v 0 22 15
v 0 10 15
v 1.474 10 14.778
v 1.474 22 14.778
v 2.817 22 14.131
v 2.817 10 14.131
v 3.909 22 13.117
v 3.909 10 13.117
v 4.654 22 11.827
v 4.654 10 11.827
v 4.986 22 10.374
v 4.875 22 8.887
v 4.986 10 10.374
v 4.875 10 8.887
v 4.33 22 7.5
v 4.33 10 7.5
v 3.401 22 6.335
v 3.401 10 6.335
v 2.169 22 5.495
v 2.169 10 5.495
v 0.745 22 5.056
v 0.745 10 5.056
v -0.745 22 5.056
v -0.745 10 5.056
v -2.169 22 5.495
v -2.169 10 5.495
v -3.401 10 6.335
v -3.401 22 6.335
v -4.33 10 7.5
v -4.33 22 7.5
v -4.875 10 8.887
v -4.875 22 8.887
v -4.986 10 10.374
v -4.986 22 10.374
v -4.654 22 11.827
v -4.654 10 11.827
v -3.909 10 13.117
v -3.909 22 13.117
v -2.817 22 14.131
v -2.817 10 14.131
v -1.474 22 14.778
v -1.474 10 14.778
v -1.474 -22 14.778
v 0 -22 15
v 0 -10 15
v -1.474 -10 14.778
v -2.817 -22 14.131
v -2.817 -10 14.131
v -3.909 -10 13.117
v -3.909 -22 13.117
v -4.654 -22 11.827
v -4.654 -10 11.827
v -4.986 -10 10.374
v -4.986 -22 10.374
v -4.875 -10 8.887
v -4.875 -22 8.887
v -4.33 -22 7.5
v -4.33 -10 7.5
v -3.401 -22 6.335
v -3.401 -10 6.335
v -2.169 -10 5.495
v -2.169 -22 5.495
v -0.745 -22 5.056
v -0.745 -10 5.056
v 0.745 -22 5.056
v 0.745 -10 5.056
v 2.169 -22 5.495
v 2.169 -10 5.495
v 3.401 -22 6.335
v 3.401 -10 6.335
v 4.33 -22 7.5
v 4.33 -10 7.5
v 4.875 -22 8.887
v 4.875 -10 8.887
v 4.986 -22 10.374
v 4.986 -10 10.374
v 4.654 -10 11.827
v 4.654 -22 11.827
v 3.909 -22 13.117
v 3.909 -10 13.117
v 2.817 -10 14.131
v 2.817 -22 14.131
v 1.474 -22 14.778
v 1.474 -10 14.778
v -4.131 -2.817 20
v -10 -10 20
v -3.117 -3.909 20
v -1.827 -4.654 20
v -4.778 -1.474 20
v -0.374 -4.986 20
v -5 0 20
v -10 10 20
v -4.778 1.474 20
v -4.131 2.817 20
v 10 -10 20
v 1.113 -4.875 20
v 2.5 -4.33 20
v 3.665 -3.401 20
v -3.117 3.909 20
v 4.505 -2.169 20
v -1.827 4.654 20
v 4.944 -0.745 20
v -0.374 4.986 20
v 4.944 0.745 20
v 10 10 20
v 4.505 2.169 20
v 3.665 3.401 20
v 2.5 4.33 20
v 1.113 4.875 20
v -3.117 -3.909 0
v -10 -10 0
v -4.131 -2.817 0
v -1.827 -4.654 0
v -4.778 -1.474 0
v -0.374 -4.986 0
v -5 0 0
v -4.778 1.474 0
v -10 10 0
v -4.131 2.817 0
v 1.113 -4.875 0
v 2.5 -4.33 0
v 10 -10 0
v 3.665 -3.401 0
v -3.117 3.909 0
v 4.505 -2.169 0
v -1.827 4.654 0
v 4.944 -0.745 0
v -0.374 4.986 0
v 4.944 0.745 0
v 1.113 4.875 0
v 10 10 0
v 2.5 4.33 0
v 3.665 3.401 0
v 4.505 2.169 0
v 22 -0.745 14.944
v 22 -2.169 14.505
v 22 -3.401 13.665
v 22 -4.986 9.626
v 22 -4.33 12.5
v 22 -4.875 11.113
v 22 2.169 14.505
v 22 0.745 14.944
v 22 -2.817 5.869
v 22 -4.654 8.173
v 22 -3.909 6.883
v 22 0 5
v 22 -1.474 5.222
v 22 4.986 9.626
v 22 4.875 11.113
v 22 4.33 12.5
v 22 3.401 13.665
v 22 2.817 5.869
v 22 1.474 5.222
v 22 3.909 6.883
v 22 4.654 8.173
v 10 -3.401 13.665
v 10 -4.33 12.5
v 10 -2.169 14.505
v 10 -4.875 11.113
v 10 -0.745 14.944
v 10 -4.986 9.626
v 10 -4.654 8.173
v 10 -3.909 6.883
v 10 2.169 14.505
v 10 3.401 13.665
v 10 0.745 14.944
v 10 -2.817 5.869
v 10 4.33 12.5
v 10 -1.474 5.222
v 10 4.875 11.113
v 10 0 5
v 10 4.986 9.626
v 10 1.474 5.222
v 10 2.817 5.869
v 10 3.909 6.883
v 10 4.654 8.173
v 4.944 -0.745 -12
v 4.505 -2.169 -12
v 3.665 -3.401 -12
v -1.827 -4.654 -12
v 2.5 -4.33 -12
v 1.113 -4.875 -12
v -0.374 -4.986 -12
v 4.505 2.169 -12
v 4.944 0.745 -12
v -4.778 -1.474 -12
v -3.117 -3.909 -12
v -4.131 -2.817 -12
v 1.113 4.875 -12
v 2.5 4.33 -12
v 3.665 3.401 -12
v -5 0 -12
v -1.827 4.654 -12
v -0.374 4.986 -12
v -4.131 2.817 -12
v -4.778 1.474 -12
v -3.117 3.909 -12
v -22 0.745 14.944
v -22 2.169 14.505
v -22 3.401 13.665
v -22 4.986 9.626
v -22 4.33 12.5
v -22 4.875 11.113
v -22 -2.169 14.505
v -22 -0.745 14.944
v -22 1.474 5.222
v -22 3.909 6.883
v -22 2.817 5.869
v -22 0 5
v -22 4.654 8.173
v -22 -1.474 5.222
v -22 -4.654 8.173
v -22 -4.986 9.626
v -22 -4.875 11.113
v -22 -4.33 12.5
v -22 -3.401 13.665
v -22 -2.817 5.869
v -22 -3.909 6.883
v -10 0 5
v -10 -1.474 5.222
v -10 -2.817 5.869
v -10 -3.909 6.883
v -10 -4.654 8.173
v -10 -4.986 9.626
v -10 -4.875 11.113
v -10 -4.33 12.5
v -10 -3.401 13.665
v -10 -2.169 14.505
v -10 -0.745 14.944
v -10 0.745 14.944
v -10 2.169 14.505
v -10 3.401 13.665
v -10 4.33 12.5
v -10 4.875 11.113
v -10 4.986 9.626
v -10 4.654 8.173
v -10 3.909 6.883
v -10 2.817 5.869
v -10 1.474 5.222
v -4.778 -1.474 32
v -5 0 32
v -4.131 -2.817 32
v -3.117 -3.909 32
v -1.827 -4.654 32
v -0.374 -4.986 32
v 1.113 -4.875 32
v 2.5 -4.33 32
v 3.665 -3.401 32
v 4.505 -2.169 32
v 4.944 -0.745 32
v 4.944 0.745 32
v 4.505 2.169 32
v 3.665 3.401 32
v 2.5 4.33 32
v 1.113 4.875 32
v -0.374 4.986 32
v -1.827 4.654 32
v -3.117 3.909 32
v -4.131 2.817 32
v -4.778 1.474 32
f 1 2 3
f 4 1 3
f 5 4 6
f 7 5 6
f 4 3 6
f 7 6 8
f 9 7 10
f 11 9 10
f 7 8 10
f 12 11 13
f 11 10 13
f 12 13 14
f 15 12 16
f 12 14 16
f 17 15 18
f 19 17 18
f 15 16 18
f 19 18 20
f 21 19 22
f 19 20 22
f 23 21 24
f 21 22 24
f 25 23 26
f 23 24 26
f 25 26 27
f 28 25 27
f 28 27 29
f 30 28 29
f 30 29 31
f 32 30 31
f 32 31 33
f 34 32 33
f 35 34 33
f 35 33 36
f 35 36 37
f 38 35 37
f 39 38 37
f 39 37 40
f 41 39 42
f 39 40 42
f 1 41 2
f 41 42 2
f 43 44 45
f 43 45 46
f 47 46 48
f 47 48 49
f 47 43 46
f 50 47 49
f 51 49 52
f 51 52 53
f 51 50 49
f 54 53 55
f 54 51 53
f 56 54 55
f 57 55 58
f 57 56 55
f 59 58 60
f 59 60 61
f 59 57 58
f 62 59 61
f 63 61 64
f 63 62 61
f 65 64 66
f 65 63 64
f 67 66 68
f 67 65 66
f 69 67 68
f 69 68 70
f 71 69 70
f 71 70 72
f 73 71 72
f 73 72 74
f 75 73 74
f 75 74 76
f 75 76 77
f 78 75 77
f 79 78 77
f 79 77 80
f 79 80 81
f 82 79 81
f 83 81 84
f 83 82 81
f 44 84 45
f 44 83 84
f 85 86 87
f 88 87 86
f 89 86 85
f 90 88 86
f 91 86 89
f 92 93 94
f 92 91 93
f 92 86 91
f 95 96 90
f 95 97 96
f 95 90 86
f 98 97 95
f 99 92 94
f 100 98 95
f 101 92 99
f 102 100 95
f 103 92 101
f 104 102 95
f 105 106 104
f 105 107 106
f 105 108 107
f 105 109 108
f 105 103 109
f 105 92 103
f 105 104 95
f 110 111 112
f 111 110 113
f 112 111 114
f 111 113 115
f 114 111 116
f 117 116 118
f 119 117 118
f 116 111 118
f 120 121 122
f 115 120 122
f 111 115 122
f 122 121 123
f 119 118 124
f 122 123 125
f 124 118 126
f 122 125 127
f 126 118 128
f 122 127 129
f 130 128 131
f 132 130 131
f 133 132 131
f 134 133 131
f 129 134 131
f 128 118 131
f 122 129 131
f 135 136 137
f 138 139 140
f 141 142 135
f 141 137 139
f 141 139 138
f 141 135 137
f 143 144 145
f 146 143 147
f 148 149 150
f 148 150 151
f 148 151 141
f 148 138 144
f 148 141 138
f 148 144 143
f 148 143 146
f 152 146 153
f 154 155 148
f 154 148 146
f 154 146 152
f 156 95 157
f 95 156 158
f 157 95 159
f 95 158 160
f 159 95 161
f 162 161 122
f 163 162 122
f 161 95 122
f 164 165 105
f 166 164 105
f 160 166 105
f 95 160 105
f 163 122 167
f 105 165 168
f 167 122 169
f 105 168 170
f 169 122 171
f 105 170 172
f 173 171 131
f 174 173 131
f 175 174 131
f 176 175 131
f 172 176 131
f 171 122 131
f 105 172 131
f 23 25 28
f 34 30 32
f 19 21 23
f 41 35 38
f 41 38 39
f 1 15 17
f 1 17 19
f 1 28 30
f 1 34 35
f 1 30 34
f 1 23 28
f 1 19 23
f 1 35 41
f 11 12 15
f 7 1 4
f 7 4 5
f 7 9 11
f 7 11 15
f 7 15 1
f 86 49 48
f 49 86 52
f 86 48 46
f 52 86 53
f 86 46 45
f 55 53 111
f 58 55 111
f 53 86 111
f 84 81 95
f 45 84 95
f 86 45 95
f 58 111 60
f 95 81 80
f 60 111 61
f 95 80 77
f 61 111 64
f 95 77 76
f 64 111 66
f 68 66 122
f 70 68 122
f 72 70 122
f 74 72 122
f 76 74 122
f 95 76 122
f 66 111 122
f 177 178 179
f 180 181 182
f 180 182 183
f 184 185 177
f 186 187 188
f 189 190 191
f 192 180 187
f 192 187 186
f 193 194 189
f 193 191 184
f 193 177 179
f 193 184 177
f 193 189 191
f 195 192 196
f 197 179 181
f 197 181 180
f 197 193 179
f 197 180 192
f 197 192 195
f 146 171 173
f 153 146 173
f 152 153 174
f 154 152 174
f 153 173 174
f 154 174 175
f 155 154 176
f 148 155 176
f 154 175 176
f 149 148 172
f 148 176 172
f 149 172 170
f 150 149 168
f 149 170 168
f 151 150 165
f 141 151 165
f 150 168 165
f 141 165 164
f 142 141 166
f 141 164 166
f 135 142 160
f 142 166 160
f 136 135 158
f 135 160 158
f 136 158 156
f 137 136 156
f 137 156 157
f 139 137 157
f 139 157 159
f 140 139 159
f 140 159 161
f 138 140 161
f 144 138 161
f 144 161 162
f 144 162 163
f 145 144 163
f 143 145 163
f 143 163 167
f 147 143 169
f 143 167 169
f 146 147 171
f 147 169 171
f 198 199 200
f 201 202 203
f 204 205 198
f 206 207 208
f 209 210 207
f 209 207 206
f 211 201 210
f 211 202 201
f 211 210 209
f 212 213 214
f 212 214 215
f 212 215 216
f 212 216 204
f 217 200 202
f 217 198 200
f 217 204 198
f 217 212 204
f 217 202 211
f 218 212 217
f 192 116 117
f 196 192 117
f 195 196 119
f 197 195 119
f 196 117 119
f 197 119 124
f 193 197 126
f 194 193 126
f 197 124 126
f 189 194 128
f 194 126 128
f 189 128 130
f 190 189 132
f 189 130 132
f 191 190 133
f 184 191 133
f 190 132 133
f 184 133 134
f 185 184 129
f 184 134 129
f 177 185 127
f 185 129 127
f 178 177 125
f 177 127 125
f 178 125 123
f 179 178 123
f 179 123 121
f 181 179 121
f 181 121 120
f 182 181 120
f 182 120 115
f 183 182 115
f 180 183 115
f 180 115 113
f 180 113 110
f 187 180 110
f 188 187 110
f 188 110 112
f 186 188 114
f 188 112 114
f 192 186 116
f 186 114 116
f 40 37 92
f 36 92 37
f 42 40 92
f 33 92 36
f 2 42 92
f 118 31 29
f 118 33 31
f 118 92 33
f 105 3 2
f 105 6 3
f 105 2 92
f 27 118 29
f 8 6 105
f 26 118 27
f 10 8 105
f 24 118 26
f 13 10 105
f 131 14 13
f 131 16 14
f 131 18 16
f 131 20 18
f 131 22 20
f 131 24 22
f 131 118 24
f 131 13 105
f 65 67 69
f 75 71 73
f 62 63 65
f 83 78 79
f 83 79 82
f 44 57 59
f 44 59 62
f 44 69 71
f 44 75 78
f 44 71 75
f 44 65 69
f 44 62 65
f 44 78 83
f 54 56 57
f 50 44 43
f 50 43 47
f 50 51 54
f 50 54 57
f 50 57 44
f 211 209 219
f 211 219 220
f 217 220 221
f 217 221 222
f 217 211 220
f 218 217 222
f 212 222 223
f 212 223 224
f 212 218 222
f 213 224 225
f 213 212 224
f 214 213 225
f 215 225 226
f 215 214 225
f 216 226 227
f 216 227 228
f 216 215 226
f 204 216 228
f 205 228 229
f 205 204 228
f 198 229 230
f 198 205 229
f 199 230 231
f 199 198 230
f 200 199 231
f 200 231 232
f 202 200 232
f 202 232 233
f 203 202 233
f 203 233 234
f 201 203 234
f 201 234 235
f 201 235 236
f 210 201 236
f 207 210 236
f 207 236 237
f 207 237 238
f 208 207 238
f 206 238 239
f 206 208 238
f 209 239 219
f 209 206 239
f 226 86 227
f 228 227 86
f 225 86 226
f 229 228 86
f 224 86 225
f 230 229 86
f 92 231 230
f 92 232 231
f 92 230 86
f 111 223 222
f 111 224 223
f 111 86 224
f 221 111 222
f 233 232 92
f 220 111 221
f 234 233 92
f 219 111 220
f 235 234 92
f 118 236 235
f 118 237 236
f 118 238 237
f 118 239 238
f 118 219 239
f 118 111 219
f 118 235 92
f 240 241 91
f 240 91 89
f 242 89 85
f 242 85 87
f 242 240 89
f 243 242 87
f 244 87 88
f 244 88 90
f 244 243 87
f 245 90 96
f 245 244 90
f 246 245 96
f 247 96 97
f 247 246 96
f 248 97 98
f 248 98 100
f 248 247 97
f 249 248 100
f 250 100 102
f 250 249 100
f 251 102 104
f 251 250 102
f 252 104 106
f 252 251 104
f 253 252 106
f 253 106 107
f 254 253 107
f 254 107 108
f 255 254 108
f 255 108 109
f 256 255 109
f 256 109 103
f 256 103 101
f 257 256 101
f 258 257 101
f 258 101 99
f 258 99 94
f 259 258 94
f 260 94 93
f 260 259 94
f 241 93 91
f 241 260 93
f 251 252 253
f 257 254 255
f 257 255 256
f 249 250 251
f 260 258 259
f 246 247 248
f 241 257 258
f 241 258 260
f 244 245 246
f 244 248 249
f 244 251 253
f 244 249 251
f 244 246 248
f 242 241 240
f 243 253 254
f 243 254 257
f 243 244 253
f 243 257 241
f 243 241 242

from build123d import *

# Parameters (mm, degrees)
ESBO_O1_W                = 20
ESBO_O1_H                = 20
RESSALTO_EXTRUS_O1_DEPTH = 20
ESBO_O2_R                = 5
RESSALTO_EXTRUS_O2_DEPTH = 12
ESBO_O3_R                = 5
RESSALTO_EXTRUS_O3_DEPTH = 12
RESSALTO_EXTRUS_O4_START = 12
ESBO_O4_R                = 5
RESSALTO_EXTRUS_O4_DEPTH = 12
RESSALTO_EXTRUS_O5_START = 12
ESBO_O5_R                = 5
RESSALTO_EXTRUS_O5_DEPTH = 12
ESBO_O6_R                = 5
RESSALTO_EXTRUS_O6_DEPTH = 12
RESSALTO_EXTRUS_O7_START = 12
ESBO_O7_R                = 5
RESSALTO_EXTRUS_O7_DEPTH = 12


with BuildPart() as part:
    # Esboço1 → Ressalto-extrusão1 (new body)
    with BuildSketch(Plane.XY):
        Rectangle(ESBO_O1_W, ESBO_O1_H)
    extrude(amount=RESSALTO_EXTRUS_O1_DEPTH)

    # Esboço2 → Ressalto-extrusão2 (add)
    with BuildSketch(Plane(origin=(10, 0, 0), x_dir=(0, 0, -1), z_dir=(1, 0, 0))):
        with Locations((-10, 0)):
            Circle(ESBO_O2_R)
    extrude(amount=RESSALTO_EXTRUS_O2_DEPTH)

    # Esboço3 → Ressalto-extrusão3 (add)
    with BuildSketch(Plane(origin=(0, 10, 0), x_dir=(1, 0, 0), z_dir=(0, 1, 0))):
        with Locations(Location((0, -10, 0), (0, 0, 270))):
            Circle(ESBO_O3_R)
    extrude(amount=RESSALTO_EXTRUS_O3_DEPTH)

    # Esboço4 → Ressalto-extrusão4 (add)
    with BuildSketch(Plane.ZY.offset(10).offset(RESSALTO_EXTRUS_O4_START)):
        with Locations(Location((10, 0, 0), (0, 0, 180))):
            Circle(ESBO_O4_R)
    extrude(amount=-RESSALTO_EXTRUS_O4_DEPTH)

    # Esboço5 → Ressalto-extrusão5 (add)
    with BuildSketch(Plane.XZ.offset(10).offset(RESSALTO_EXTRUS_O5_START)):
        with Locations(Location((0, 10, 0), (0, 0, 90))):
            Circle(ESBO_O5_R)
    extrude(amount=-RESSALTO_EXTRUS_O5_DEPTH)

    # Esboço6 → Ressalto-extrusão6 (add)
    with BuildSketch(Plane(origin=(0, 0, 0), x_dir=(-1, 0, 0), z_dir=(0, 0, -1))):
        Circle(ESBO_O6_R)
    extrude(amount=RESSALTO_EXTRUS_O6_DEPTH)

    # Esboço7 → Ressalto-extrusão7 (add)
    with BuildSketch(Plane.XY.offset(20).offset(RESSALTO_EXTRUS_O7_START)):
        with Locations(Location((0, 0, 0), (0, 0, 180))):
            Circle(ESBO_O7_R)
    extrude(amount=-RESSALTO_EXTRUS_O7_DEPTH)


solid = part.part
